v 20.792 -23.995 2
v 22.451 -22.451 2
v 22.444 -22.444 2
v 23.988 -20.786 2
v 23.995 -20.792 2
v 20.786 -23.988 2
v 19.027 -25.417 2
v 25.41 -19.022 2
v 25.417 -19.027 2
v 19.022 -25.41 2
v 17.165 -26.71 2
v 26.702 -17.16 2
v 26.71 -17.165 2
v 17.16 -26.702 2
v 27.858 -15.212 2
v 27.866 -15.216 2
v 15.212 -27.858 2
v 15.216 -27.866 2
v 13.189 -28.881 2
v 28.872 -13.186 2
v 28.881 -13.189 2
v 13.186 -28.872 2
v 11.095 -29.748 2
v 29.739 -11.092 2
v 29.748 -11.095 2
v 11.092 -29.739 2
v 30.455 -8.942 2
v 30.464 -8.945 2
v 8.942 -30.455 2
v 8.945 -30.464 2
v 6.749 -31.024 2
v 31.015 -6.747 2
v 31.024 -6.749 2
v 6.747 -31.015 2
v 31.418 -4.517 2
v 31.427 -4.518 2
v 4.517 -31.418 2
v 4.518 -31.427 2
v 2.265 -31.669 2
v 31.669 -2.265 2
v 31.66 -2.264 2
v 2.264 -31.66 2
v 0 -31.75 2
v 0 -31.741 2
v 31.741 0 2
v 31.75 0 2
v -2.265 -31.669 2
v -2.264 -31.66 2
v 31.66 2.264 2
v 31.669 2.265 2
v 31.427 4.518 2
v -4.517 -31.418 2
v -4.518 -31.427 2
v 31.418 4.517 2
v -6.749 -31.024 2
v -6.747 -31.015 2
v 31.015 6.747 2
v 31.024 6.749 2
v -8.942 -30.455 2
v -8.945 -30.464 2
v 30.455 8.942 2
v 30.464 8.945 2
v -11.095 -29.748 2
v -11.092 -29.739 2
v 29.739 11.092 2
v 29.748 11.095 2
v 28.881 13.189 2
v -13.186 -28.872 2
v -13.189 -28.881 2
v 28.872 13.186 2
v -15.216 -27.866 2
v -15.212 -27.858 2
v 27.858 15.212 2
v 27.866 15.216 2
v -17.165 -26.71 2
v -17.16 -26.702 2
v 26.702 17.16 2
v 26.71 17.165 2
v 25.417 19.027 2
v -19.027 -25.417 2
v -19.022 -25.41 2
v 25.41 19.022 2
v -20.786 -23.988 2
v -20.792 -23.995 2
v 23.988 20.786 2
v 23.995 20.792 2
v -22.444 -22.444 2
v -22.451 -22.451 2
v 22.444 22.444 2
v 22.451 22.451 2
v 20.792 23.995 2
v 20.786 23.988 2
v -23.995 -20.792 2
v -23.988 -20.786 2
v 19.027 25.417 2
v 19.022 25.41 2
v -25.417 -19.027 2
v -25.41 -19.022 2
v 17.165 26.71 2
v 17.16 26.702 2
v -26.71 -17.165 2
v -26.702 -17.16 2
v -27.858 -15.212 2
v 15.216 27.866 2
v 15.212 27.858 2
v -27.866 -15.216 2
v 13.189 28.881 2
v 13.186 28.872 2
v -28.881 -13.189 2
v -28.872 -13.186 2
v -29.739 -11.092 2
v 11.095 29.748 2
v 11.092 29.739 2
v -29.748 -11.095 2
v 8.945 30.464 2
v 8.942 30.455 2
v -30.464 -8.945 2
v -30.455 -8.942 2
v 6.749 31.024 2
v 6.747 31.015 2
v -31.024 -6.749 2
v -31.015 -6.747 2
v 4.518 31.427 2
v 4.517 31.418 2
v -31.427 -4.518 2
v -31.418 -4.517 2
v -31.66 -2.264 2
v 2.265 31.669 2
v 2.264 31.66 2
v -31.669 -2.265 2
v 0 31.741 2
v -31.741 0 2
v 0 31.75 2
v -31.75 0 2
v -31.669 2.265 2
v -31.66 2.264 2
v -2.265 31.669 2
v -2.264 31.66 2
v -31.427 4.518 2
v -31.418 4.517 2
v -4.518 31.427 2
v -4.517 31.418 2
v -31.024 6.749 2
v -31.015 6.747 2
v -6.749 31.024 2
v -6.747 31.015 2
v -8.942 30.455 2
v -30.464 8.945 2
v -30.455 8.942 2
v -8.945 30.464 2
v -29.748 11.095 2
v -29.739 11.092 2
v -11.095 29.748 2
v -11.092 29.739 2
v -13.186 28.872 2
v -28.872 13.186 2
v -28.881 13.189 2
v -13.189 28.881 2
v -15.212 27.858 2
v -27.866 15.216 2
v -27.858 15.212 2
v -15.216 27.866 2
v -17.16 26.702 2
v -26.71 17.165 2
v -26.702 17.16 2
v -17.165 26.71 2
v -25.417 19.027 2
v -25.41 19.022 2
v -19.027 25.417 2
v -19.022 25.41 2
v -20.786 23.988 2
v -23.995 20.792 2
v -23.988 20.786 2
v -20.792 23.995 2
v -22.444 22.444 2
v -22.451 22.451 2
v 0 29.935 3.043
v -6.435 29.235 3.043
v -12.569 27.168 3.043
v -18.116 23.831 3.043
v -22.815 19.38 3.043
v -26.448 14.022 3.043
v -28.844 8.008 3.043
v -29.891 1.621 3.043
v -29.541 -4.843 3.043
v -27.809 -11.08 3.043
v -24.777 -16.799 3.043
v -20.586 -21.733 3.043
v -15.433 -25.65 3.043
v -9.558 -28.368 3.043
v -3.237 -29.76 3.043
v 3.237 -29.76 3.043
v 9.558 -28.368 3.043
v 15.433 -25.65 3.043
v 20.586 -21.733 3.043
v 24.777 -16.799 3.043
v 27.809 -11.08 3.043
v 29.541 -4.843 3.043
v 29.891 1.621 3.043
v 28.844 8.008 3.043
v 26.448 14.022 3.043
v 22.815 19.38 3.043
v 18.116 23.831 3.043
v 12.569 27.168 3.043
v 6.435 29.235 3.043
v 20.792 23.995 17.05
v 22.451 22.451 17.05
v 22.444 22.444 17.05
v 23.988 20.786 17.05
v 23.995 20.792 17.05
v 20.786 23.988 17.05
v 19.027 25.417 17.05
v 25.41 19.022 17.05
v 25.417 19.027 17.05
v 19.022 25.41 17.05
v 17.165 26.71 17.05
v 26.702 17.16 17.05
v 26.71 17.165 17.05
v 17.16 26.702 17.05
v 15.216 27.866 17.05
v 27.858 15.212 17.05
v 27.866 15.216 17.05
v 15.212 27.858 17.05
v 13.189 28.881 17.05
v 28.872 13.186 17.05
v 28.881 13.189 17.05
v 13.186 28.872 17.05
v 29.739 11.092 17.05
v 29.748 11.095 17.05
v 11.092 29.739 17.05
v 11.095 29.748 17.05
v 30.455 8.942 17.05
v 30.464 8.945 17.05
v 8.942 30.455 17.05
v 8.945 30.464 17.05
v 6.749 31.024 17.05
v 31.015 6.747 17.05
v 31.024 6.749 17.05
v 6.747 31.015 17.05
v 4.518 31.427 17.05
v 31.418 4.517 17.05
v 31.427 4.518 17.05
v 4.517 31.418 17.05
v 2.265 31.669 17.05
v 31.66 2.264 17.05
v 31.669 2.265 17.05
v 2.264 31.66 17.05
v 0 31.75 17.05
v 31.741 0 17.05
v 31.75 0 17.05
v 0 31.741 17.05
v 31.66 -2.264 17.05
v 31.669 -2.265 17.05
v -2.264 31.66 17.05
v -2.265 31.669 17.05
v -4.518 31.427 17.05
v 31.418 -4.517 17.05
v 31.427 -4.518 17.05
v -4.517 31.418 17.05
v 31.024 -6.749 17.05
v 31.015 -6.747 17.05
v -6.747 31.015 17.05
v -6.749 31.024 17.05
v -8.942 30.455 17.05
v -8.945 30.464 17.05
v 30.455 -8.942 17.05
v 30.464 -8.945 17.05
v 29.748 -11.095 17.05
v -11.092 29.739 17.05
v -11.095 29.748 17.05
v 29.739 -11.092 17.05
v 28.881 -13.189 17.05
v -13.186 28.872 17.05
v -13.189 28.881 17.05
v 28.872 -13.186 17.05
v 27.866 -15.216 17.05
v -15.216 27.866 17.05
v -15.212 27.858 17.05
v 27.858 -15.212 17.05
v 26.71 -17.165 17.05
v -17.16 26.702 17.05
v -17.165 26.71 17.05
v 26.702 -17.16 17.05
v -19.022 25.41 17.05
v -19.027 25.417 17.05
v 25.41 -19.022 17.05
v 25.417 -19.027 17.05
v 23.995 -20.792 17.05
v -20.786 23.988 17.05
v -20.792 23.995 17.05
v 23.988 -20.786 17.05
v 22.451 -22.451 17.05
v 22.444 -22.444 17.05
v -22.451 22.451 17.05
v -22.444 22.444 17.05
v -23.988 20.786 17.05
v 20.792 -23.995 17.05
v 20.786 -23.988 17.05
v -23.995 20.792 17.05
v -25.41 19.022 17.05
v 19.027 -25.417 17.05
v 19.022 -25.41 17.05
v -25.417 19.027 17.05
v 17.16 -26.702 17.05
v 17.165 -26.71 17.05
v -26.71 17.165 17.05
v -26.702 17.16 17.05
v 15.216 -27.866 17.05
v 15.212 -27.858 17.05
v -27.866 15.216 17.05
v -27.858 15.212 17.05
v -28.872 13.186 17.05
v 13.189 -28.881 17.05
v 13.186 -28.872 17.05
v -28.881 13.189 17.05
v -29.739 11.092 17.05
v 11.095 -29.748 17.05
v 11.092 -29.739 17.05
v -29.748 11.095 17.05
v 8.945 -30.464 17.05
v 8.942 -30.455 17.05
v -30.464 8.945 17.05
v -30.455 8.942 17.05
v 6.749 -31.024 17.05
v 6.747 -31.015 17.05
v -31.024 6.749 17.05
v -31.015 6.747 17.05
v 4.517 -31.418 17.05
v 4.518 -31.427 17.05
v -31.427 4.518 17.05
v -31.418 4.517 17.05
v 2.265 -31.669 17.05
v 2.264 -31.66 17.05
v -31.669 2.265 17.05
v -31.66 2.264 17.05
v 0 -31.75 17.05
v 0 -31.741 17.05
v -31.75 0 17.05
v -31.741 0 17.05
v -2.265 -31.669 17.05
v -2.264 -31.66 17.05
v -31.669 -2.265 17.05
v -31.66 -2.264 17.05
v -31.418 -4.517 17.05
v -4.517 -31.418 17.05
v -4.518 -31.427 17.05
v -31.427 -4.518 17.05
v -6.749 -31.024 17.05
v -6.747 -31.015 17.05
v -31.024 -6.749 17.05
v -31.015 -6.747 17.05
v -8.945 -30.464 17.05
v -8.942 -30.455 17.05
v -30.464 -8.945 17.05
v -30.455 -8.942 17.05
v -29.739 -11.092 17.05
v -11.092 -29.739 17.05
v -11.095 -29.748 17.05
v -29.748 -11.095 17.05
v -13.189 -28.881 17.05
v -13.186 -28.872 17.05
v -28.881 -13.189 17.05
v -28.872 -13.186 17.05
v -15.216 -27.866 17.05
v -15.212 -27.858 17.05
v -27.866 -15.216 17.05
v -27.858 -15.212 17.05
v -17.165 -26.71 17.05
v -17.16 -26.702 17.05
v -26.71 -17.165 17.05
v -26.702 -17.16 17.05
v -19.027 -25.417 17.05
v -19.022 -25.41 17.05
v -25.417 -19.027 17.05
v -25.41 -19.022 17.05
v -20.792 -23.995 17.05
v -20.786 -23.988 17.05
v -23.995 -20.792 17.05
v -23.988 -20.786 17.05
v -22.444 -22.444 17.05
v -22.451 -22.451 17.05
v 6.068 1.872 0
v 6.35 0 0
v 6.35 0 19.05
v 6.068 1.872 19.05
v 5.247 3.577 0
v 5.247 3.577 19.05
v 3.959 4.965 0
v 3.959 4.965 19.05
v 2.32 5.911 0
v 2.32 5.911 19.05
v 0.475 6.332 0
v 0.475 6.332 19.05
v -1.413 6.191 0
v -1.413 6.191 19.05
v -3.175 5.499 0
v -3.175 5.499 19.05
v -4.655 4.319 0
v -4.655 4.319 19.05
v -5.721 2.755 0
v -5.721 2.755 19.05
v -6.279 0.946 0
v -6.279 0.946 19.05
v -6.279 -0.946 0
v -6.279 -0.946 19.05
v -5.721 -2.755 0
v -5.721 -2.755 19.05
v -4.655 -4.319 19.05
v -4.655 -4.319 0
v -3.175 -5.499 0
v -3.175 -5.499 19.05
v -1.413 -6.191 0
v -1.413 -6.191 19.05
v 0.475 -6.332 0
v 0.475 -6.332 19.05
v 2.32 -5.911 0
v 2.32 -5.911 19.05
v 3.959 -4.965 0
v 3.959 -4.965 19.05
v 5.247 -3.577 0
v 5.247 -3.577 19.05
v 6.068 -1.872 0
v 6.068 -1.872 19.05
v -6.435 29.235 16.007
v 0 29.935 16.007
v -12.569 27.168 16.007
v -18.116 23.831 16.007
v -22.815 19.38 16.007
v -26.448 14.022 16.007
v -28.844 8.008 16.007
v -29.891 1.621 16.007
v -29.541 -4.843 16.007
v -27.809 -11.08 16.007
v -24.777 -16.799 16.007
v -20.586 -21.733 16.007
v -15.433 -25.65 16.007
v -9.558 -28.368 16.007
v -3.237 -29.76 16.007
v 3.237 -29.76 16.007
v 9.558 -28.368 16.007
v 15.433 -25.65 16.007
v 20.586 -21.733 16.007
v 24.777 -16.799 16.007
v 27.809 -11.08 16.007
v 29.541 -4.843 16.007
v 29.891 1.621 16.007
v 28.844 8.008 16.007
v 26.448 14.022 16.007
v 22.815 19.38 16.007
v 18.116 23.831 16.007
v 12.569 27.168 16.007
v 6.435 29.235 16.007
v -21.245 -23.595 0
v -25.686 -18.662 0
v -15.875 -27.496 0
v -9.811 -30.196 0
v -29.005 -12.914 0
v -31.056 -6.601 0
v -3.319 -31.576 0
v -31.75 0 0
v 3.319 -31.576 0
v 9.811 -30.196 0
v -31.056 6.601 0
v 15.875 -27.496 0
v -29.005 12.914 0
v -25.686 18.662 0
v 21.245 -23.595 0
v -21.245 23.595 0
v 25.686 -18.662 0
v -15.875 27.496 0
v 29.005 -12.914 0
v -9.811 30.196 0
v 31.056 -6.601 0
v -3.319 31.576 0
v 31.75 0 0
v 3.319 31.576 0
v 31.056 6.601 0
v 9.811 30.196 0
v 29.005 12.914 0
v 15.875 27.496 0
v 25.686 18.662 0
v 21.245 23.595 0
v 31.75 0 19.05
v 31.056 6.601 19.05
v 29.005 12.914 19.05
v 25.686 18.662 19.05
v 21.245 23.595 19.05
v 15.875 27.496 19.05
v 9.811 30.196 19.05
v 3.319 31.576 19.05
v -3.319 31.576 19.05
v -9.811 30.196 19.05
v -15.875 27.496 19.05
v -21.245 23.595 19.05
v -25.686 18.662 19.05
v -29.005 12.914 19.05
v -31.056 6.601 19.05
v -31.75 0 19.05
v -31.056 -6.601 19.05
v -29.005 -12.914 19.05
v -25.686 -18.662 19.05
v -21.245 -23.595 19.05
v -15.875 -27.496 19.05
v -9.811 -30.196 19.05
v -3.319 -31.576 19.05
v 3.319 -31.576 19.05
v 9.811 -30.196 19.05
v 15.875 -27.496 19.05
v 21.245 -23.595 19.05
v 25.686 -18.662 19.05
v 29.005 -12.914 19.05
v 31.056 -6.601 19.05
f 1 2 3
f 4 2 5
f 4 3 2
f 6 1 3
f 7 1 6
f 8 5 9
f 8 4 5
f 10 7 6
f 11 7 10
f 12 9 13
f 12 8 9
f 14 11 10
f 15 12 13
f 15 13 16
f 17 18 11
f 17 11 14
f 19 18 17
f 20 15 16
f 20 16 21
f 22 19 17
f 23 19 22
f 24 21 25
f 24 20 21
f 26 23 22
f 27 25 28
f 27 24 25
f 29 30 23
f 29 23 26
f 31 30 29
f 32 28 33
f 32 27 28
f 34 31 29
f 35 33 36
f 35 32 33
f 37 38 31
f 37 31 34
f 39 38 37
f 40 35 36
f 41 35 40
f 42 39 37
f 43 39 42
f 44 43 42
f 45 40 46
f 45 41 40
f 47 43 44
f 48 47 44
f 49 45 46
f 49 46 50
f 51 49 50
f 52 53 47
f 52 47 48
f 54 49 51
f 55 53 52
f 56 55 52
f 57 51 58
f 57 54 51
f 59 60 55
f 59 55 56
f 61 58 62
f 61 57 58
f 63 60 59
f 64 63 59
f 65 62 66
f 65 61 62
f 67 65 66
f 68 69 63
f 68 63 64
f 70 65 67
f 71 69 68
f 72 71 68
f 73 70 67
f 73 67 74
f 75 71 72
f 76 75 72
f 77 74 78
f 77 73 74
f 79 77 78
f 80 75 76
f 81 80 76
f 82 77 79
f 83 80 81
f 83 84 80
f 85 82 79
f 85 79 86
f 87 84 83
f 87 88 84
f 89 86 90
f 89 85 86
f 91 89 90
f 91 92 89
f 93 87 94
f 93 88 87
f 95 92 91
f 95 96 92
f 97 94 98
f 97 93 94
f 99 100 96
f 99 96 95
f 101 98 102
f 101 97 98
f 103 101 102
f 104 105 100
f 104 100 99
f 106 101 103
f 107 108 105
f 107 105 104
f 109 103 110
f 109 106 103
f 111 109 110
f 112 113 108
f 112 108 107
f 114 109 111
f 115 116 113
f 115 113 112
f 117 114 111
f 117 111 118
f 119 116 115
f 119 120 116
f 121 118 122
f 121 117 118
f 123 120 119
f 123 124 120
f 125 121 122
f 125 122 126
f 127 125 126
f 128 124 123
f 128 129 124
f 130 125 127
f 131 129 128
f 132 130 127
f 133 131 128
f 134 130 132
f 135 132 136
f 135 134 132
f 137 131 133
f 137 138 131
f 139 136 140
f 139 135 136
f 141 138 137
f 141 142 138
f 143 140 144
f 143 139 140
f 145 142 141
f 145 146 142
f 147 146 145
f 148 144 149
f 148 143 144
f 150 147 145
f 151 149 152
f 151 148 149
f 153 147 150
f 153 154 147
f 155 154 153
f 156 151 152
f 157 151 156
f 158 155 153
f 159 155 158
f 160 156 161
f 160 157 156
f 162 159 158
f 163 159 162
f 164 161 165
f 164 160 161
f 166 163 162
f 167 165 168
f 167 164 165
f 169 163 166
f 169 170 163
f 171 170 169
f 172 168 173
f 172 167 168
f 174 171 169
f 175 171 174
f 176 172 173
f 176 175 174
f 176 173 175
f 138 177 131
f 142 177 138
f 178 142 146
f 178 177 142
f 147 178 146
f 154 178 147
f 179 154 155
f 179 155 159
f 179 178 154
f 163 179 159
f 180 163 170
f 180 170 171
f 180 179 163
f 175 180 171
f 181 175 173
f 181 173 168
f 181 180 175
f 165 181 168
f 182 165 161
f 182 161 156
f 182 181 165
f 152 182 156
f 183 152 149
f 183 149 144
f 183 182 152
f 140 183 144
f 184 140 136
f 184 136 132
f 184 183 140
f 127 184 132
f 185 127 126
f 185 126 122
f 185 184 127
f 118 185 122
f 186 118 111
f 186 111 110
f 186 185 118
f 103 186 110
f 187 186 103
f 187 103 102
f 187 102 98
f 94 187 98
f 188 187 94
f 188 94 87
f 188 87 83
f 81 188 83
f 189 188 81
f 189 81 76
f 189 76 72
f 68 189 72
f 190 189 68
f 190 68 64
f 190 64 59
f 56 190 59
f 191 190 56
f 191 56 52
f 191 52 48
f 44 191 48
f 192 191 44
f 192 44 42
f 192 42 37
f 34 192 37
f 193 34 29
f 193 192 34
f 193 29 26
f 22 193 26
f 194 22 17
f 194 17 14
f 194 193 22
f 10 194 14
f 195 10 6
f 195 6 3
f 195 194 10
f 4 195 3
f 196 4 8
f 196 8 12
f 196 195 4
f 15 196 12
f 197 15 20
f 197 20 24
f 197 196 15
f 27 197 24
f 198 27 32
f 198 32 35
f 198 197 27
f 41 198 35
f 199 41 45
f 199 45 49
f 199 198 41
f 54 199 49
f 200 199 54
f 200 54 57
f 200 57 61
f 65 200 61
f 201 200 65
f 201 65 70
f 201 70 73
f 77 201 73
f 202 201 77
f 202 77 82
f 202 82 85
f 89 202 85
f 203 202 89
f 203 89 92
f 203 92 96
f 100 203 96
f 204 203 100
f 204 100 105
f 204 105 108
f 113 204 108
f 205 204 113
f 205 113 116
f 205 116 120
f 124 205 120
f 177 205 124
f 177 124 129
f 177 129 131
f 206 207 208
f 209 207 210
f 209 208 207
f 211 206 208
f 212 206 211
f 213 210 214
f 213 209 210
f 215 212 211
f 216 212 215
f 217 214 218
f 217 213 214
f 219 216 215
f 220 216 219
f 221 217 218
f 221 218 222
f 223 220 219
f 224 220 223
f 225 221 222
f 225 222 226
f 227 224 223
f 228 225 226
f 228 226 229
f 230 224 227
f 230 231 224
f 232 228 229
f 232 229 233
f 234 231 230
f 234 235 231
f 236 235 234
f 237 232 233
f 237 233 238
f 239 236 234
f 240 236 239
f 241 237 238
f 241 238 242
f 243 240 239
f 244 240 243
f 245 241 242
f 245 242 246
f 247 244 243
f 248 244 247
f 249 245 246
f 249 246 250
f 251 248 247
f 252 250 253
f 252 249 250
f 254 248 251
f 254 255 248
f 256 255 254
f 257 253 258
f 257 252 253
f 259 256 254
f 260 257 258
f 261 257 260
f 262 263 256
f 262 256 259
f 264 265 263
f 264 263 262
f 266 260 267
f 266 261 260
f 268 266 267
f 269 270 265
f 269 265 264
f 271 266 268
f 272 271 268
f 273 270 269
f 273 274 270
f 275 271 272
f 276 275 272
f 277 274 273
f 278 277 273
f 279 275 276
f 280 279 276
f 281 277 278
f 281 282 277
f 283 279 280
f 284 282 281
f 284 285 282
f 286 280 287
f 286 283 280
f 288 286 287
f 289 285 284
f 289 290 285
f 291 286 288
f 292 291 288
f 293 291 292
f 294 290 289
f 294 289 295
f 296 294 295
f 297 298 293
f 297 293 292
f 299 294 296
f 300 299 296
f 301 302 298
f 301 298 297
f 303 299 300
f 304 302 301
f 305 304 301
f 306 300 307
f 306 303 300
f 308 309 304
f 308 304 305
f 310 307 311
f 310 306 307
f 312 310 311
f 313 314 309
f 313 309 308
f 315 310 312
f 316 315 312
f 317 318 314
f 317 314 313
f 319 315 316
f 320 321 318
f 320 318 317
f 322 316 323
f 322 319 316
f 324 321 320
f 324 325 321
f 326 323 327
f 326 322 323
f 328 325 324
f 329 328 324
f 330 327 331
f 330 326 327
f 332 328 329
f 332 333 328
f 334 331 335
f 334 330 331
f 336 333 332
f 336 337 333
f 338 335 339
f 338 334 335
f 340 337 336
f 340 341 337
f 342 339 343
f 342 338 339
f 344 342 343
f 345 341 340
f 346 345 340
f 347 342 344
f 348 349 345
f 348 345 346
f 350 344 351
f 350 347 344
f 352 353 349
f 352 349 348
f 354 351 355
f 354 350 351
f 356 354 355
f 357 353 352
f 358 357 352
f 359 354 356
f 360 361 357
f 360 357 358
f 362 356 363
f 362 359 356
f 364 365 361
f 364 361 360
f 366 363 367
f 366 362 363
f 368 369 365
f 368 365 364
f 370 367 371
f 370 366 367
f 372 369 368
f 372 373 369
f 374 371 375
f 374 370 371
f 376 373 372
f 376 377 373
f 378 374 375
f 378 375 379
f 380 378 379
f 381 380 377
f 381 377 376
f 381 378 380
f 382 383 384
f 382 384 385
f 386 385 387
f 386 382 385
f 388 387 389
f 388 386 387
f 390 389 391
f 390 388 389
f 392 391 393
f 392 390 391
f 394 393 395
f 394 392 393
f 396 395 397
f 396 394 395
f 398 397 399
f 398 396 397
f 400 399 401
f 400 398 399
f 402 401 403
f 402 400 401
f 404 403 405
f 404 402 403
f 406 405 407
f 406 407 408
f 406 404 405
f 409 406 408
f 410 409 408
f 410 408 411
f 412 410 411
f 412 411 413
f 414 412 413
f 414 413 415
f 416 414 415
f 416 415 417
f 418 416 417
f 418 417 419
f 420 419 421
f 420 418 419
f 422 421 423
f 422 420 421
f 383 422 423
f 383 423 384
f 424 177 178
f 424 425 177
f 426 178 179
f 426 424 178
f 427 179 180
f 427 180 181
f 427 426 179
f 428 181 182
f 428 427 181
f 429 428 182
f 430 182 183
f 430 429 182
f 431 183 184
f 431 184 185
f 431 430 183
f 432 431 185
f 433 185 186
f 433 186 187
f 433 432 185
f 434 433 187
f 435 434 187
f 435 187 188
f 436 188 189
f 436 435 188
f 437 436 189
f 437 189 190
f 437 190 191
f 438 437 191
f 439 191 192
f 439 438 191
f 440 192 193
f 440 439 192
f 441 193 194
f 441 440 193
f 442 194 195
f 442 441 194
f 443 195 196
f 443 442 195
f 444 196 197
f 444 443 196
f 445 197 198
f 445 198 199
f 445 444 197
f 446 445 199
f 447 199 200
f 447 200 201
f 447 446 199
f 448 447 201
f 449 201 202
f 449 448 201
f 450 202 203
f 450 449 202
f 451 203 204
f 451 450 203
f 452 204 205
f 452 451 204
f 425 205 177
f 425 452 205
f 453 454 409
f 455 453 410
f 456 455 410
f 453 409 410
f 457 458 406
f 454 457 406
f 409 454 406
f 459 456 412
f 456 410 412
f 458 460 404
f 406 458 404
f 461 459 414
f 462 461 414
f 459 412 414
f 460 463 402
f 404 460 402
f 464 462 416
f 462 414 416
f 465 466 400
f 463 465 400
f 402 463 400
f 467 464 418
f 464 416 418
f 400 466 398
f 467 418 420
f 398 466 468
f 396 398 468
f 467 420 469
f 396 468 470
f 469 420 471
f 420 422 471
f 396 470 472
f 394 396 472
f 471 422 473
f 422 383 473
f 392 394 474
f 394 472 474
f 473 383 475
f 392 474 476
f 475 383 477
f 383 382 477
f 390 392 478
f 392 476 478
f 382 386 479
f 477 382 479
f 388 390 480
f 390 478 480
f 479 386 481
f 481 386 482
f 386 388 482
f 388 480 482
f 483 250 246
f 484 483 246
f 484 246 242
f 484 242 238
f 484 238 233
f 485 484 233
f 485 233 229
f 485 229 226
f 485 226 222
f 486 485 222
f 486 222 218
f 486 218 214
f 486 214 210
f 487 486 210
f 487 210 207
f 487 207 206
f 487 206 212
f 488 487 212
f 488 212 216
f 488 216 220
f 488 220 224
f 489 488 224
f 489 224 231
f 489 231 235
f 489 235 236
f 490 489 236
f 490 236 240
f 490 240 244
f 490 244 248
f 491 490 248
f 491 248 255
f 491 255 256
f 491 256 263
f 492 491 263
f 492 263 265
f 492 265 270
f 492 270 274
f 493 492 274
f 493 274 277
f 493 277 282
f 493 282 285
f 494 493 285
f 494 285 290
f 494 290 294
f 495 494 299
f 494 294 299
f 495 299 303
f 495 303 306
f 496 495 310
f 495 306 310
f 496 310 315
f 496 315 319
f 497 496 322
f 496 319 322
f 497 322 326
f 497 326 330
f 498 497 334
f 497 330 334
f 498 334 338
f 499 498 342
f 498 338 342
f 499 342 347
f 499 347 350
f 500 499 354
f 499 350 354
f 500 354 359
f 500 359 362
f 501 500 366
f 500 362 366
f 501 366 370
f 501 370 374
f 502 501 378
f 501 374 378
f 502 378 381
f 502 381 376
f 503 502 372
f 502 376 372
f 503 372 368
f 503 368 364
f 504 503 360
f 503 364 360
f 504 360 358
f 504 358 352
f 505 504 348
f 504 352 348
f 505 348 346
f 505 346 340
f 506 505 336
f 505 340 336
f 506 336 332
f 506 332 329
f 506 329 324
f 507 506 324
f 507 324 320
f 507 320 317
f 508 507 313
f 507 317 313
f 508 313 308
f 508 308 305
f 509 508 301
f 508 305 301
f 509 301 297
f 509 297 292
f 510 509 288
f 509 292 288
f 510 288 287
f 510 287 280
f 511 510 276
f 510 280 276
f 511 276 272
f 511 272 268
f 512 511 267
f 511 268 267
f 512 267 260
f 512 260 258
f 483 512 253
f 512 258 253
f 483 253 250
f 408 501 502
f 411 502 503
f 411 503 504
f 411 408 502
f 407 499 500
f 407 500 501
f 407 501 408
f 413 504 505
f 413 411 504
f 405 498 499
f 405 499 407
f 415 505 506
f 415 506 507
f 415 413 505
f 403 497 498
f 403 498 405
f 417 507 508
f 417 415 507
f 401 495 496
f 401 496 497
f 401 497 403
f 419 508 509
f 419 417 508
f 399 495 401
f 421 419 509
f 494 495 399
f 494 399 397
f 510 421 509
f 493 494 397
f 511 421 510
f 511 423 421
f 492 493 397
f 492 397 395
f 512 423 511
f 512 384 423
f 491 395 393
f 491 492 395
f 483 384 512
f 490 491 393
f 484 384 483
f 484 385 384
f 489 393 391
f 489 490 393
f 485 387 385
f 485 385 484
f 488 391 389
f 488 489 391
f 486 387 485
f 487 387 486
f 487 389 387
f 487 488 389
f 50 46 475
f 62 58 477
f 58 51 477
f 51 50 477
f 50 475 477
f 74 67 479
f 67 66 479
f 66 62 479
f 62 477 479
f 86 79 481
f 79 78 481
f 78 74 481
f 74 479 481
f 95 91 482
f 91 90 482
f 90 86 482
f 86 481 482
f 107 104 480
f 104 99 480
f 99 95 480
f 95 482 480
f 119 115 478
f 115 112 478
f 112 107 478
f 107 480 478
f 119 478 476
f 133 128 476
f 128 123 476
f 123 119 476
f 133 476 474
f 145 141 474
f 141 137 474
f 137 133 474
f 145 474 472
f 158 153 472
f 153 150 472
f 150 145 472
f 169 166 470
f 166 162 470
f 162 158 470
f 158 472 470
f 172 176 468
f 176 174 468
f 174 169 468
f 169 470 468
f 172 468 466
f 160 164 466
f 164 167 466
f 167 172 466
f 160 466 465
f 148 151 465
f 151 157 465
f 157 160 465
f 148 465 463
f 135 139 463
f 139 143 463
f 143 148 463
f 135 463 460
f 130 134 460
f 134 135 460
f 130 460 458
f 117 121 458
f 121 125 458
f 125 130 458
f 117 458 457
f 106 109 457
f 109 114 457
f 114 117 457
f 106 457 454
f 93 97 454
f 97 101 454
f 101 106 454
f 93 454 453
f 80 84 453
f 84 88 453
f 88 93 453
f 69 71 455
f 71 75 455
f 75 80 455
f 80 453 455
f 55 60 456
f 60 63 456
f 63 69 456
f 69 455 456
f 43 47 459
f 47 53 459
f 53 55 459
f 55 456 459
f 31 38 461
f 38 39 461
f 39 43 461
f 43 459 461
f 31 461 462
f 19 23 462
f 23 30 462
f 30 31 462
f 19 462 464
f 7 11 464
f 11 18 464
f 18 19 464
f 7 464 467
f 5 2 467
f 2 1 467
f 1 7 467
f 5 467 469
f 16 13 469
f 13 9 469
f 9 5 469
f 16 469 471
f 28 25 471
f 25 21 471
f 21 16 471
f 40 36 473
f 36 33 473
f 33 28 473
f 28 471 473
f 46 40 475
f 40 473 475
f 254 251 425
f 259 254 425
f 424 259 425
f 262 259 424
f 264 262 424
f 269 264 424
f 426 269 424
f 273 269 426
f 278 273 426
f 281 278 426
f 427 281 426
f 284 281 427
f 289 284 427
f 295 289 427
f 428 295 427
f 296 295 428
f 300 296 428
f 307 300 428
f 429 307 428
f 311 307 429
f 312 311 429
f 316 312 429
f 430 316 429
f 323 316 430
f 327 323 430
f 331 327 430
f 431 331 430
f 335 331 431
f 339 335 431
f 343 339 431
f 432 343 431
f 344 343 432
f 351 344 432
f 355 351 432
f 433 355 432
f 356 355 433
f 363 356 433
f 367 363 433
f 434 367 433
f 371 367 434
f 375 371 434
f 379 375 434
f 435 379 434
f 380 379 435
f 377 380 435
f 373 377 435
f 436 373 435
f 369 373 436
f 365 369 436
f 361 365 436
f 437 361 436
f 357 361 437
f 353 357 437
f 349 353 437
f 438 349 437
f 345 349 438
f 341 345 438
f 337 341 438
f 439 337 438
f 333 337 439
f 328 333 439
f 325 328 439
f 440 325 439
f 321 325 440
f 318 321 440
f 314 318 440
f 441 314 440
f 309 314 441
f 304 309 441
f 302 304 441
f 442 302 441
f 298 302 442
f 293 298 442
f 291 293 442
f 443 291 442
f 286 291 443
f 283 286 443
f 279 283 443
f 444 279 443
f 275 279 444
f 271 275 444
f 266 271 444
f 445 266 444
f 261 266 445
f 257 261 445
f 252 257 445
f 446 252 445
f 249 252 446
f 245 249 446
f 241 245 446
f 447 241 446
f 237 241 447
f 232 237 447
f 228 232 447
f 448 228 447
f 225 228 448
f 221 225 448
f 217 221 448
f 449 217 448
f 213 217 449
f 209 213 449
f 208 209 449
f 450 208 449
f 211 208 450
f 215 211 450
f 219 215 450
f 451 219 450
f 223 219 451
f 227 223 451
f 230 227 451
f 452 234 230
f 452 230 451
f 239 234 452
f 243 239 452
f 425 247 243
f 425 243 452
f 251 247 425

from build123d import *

# Parameters (mm, degrees)
CROQUIS1_R              = 31.75
CROQUIS1_R_2            = 6.35
SALIENTE_EXTRUIR1_DEPTH = 19.05


with BuildPart() as part:
    # Croquis1 → Saliente-Extruir1 (new body)
    with BuildSketch(Plane.XY):
        Circle(CROQUIS1_R)
        Circle(CROQUIS1_R_2, mode=Mode.SUBTRACT)
    extrude(amount=SALIENTE_EXTRUIR1_DEPTH)

    # Croquis2 → Cortar-Revolución2 (revolve, cut)
    with BuildSketch(Plane(origin=(0, 0, 0), x_dir=(0, 0, -1), z_dir=(1, 0, 0))):
        Polygon((-3.042533403, 29.934999), (-16.007466597, 29.934999), (-17.05, 31.740719823), (-17.05, 32.934999), (-2, 32.934999), (-2, 31.740719823), align=None)
    revolve(axis=Axis((0, 0, 0), (0, 0, 1)), mode=Mode.SUBTRACT)


solid = part.part
